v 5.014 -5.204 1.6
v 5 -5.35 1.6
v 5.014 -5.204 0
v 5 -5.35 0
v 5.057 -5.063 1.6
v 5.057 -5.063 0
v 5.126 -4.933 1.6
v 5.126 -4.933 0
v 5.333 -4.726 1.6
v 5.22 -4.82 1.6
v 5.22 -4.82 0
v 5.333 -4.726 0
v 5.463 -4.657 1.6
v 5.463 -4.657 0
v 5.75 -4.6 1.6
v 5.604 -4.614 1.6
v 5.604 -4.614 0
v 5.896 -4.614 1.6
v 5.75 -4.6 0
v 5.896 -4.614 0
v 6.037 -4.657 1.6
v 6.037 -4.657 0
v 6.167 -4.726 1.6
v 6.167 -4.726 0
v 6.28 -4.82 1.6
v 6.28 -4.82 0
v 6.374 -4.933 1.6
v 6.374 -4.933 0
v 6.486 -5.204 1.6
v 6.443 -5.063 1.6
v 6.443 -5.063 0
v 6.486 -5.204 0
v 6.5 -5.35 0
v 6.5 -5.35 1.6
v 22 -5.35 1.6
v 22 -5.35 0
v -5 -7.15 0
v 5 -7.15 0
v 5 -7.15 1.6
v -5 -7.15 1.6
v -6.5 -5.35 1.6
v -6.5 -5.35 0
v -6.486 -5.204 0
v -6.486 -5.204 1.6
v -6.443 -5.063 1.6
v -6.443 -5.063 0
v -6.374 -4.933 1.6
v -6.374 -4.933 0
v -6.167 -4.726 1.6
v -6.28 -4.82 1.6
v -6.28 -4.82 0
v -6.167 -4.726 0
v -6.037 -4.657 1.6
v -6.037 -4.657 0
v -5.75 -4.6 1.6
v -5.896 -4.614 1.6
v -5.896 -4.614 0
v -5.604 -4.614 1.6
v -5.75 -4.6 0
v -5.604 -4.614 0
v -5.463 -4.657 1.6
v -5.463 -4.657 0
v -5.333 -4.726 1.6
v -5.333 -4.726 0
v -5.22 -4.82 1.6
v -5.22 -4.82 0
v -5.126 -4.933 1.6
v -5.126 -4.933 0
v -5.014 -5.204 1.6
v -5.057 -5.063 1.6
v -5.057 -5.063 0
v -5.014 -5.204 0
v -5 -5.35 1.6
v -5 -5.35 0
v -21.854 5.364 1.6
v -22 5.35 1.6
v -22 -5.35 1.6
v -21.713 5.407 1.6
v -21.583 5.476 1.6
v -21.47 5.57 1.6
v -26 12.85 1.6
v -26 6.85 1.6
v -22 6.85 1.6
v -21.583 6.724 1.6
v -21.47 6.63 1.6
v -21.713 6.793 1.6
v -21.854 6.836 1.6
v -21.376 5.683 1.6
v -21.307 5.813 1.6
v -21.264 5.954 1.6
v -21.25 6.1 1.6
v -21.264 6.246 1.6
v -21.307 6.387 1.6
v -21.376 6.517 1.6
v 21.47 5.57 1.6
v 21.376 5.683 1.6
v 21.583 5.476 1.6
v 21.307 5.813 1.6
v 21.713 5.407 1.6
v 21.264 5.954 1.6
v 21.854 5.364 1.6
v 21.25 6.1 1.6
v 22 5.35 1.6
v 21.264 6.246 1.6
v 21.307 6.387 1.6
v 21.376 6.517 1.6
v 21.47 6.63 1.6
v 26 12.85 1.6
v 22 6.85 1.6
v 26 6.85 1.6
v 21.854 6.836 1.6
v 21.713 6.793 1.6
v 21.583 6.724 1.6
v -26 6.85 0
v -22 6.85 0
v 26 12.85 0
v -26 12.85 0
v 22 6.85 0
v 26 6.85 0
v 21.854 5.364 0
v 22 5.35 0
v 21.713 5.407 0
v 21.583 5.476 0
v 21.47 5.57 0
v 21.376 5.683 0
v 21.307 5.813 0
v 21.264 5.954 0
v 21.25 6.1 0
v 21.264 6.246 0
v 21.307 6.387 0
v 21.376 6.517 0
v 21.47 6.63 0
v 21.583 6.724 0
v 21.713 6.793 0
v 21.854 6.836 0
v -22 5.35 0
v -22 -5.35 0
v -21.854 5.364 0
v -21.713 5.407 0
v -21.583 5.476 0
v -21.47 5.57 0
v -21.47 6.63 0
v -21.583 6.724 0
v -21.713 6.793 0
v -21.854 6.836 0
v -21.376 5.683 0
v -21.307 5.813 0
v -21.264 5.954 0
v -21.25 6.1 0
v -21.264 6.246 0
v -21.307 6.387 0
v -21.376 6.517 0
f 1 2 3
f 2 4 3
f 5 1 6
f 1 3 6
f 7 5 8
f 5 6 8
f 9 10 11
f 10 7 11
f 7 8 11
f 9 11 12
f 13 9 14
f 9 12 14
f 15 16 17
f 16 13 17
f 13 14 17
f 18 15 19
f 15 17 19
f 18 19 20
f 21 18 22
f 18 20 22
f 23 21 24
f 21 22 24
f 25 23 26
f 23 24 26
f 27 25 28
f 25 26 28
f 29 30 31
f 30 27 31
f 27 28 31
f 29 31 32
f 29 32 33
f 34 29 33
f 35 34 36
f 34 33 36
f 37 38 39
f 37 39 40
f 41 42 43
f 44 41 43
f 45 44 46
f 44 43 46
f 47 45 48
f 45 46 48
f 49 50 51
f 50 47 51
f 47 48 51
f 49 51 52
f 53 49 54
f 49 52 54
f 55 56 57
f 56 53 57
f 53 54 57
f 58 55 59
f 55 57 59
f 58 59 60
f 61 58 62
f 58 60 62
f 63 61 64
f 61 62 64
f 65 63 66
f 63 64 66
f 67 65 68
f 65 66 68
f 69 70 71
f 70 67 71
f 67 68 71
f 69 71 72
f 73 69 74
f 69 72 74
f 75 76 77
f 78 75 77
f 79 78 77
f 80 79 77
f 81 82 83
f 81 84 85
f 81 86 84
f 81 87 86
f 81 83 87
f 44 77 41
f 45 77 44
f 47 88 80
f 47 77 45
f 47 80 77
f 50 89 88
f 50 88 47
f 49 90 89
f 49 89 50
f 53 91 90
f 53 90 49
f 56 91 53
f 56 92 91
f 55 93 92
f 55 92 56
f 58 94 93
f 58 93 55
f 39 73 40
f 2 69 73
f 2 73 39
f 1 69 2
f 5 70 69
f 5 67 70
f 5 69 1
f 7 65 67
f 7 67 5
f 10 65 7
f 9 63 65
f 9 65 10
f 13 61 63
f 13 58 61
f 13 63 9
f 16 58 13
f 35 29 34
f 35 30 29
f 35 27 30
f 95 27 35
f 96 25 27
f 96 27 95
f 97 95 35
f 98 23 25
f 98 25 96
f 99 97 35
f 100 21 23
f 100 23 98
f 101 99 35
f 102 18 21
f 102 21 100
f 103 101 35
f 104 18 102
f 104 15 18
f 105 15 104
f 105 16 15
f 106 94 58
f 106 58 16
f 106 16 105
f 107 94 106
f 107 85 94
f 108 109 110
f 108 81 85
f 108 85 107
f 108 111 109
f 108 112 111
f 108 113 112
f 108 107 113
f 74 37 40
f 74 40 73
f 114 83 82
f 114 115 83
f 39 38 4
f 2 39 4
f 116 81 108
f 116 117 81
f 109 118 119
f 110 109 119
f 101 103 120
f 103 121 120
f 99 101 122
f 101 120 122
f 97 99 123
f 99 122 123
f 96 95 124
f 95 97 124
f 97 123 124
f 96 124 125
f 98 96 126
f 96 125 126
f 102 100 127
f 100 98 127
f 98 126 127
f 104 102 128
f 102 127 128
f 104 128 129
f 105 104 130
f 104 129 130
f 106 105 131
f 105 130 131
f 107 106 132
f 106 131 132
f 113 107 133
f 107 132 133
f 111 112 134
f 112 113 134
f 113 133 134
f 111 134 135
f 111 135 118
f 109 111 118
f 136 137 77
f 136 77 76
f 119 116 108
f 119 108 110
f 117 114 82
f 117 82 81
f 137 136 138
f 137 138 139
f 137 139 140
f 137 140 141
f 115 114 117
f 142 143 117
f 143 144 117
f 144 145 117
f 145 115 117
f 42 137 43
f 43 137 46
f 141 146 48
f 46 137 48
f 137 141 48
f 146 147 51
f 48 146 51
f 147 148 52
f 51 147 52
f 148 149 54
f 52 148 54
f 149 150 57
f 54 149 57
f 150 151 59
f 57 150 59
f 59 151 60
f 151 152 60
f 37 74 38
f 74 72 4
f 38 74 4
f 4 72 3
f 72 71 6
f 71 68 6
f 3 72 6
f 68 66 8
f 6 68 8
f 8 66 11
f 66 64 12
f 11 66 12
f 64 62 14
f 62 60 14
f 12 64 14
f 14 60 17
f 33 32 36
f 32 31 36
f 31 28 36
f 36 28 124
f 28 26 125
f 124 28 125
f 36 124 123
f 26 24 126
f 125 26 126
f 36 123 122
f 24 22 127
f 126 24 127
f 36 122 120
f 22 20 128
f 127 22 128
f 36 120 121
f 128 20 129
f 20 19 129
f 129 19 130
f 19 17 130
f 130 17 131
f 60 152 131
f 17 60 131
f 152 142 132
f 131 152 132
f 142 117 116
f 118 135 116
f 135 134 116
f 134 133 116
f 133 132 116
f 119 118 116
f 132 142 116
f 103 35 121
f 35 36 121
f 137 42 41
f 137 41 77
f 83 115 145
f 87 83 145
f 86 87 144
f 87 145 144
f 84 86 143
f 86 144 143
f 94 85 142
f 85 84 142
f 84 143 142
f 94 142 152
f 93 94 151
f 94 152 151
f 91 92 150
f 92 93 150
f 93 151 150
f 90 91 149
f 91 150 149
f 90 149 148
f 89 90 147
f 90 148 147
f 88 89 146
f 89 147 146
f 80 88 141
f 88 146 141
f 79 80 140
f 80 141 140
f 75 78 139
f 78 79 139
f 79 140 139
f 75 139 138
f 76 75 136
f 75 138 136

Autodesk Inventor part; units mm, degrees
ref_plane "YZ Plane" through (0, 0, 0) normal (1, 0, 0) x (0, 1, 0)
ref_plane "XZ Plane" through (0, 0, 0) normal (0, 1, 0) x (-1, 0, 0)
ref_plane "XY Plane" through (0, 0, 0) normal (0, 0, 1) x (1, 0, 0)
sketch "Sketch1" plane through (0, 0, 0) normal (0, 0, 1) x (1, 0, 0)
  line L0 (-26, 12.85) -> (26, 12.85)
  line L1 (26, 12.85) -> (26, 6.85)
  line L2 (5, -7.15) -> (-5, -7.15)
  line L3 (-26, 6.85) -> (-26, 12.85)
  line L4 (-22, -5.35) -> (-22, 5.35)
  line L5 (22, -5.35) -> (22, 5.35)
  line L6 (-22, 6.85) -> (-26, 6.85)
  line L7 (22, 6.85) -> (26, 6.85)
  line L8 (0, 5.6029) -> (0, -5.6029) construction
  arc A0 (-22, 5.35) -> (-22, 6.85) centre (-22, 6.1) ccw
  arc A1 (22, 6.85) -> (22, 5.35) centre (22, 6.1) ccw
  line L9 (-5, -7.15) -> (-5, -5.35)
  line L10 (-6.5, -5.35) -> (-22, -5.35)
  line L11 (5, -7.15) -> (5, -5.35)
  line L12 (6.5, -5.35) -> (22, -5.35)
  arc A2 (-5, -5.35) -> (-6.5, -5.35) centre (-5.75, -5.35) ccw
  arc A3 (6.5, -5.35) -> (5, -5.35) centre (5.75, -5.35) ccw
  point P0 (0, 0)
  point P1 (0, 12.85)
  point P2 (26, 0)
  point P3 (0, 0)
  point P4 (-22, 0)
  dimension "d0" = 52
  dimension "d4" = 44
  dimension "d6" = 20
  dimension "d7" = 6
  dimension "d8" = 1.5
  dimension "d18" = 10
  dimension "d19" = 1.8
  dimension "d20" = 1.5
extrude "Extrusion1" add sketch "Sketch1" along normal blind 1.6
sketch "Sketch2" plane through (0, 0, 1.6) normal (0, 0, 1) x (1, 0, 0)
  point P0 (0, 0)
  point P1 (-15, 2.97)
  point P2 (0, 2.97)
  point P3 (15, 2.97)
  dimension "d9" = 15
  dimension "d10" = 15
equation "\"d10\" = d9"
properties part number "AK-C-C10-Insert-Board"
